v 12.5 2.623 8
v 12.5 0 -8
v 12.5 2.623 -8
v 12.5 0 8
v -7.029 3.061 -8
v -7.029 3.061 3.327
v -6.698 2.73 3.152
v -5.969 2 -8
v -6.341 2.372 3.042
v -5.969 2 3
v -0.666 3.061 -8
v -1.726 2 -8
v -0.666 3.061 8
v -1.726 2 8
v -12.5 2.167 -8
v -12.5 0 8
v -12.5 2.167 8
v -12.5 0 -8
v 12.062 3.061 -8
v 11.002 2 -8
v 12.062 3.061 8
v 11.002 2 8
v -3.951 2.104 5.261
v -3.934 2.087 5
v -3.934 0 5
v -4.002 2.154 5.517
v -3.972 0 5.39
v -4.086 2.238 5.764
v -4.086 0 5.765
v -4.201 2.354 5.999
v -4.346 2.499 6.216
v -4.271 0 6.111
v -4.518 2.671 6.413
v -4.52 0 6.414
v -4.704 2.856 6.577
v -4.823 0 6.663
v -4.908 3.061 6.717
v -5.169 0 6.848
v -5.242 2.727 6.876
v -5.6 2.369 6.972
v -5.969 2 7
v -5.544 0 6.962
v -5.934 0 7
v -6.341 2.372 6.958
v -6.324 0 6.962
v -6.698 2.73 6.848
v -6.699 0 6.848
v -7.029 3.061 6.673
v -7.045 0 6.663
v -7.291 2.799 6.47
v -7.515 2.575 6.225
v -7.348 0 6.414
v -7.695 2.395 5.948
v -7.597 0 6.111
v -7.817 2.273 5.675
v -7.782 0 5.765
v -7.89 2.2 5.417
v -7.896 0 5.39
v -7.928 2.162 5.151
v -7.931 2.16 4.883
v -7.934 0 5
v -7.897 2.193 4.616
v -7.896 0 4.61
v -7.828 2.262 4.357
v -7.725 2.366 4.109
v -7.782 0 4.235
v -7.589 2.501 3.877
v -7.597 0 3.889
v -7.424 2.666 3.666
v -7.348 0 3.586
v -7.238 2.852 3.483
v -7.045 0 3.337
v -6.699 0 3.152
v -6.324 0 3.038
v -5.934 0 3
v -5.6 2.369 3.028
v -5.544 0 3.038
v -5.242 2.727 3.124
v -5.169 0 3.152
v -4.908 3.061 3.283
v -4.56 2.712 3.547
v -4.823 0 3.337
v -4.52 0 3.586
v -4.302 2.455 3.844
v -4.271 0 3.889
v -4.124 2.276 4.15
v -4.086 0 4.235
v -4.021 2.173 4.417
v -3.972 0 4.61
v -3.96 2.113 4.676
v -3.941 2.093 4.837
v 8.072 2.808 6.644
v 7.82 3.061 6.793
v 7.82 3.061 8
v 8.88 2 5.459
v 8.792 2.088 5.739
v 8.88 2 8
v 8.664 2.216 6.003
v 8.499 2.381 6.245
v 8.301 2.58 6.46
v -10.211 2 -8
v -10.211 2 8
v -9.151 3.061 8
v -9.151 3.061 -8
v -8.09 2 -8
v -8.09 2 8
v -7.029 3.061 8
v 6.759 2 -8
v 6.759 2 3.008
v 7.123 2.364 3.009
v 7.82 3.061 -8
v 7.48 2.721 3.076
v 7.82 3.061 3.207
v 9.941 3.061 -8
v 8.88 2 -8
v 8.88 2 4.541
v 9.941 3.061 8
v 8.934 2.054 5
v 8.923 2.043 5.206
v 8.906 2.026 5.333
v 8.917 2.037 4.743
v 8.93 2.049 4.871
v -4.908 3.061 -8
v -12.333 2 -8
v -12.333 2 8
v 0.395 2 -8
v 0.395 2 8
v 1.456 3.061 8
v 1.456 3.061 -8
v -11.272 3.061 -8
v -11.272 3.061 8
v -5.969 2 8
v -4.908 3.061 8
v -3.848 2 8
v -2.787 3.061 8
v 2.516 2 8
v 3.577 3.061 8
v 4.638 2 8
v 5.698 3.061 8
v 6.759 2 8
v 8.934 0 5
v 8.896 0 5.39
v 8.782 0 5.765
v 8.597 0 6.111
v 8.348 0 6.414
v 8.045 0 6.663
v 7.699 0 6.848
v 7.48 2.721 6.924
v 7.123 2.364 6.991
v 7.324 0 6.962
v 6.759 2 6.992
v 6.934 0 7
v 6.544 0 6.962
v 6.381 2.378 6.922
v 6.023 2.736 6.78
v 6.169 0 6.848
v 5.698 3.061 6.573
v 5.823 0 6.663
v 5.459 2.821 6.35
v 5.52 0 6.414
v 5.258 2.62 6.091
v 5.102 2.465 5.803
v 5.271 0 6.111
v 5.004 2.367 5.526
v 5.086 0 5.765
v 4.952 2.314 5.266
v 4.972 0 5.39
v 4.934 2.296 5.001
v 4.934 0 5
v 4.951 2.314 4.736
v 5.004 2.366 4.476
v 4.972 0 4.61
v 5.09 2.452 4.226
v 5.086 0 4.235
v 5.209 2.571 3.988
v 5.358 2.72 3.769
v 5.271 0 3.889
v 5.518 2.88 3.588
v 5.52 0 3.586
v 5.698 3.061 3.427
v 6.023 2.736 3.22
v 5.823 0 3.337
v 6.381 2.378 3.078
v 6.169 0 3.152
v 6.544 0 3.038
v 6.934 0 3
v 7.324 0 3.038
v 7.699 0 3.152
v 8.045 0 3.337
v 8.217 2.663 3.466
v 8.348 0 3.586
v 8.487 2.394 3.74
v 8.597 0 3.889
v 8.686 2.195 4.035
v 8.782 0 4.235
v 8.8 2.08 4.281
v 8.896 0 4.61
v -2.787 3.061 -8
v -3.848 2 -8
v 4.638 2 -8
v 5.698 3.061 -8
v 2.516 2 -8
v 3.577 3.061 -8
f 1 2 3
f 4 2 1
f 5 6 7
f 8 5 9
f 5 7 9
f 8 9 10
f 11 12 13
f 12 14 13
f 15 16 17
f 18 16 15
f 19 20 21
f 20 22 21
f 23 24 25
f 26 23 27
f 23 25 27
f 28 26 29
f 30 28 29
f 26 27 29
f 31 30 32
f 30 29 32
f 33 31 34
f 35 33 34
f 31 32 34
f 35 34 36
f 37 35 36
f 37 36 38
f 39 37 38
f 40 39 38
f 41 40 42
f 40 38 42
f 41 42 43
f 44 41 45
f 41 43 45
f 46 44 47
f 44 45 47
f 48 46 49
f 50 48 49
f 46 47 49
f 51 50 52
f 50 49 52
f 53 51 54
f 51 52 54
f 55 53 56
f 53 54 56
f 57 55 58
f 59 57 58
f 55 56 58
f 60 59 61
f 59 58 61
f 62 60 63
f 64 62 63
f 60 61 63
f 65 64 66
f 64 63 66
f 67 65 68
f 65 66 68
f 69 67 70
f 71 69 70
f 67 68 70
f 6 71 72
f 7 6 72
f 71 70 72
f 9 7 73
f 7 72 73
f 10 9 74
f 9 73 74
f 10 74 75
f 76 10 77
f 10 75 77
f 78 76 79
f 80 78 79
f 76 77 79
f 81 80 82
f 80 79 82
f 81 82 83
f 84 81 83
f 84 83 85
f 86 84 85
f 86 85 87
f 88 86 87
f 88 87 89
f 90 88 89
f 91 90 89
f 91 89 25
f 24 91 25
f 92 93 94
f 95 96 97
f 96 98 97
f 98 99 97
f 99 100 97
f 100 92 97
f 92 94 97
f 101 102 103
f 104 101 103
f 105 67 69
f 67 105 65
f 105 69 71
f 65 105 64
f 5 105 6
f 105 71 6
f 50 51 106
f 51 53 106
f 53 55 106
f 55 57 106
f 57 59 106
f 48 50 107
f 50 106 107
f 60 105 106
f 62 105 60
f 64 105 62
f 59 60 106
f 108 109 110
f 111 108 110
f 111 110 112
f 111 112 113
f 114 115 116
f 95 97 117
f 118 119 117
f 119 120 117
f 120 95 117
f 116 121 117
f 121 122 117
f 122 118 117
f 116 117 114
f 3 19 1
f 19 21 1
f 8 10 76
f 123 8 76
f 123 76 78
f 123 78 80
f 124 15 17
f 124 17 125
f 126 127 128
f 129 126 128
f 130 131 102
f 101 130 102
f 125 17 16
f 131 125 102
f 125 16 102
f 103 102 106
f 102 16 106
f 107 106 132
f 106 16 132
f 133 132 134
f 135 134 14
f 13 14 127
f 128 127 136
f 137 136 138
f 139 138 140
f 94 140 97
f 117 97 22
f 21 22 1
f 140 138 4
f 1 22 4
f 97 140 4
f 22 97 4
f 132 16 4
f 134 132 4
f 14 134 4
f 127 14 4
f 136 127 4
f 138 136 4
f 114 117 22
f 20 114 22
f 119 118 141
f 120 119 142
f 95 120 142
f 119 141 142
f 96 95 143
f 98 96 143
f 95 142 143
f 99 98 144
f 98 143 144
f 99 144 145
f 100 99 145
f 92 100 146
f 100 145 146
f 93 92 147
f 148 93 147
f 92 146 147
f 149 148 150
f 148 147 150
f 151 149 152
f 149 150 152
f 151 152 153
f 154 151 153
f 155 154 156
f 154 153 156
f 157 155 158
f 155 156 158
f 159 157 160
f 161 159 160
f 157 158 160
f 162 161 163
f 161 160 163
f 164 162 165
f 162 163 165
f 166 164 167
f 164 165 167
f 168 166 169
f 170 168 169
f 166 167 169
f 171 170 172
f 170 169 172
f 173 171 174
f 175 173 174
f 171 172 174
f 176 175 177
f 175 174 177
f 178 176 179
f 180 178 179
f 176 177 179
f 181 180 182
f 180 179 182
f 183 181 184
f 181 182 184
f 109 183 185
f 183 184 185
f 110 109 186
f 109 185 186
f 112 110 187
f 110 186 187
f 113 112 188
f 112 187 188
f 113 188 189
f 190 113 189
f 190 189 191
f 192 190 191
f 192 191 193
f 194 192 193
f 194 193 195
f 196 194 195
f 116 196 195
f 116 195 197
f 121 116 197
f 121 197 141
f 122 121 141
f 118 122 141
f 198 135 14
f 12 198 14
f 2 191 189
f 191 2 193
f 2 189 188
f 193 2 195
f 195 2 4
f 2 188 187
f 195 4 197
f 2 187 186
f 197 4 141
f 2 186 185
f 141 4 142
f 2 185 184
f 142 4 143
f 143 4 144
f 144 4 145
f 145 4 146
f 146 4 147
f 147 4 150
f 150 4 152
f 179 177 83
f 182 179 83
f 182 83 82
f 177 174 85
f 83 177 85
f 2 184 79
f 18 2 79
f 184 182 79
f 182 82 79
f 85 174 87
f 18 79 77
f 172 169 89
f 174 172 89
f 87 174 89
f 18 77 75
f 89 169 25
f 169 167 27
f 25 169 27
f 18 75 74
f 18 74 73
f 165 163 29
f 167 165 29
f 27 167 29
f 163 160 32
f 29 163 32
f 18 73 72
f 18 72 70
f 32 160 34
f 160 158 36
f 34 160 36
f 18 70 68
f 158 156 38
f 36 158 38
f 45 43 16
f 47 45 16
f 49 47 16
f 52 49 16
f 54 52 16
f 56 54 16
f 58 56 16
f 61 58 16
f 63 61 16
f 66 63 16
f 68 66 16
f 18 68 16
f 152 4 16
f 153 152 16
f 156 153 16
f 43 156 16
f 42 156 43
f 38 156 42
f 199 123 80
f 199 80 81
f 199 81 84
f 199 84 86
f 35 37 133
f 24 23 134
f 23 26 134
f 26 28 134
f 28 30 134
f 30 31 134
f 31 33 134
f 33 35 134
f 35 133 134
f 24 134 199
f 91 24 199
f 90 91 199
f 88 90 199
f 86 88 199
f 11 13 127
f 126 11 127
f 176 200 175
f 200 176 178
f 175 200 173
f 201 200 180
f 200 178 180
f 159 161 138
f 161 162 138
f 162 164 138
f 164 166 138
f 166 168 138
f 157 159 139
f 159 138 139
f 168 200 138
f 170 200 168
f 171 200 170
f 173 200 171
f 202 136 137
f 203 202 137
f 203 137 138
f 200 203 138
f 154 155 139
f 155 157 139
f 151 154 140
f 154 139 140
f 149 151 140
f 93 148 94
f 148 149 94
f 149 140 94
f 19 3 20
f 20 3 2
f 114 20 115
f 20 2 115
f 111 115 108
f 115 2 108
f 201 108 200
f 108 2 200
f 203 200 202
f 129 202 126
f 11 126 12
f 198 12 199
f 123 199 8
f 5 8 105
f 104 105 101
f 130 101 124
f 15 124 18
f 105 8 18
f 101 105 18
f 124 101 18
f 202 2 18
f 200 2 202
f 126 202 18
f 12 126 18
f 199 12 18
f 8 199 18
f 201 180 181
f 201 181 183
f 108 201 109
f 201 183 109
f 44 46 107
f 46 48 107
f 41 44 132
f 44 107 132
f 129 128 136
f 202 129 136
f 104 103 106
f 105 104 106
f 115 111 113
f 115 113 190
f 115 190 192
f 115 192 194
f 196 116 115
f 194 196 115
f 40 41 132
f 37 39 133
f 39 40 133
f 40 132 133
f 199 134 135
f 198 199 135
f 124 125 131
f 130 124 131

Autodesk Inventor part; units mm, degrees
ref_plane "YZ Plane" through (0, 0, 0) normal (1, 0, 0) x (0, 1, 0)
ref_plane "XZ Plane" through (0, 0, 0) normal (0, 1, 0) x (-1, 0, 0)
ref_plane "XY Plane" through (0, 0, 0) normal (0, 0, 1) x (1, 0, 0)
sketch "Sketch1" plane through (0, 0, 0) normal (0, 1, 0) x (-1, 0, 0)
  line L0 (24, 8) -> (-24, 8)
  line L1 (-24, 8) -> (-24, -8)
  line L2 (-24, -8) -> (24, -8)
  line L3 (24, -8) -> (24, 8)
  point P0 (0, 0)
  dimension "d0" = 48
  dimension "d1" = 16
extrude "Extrusion1" add sketch "Sketch1" along normal blind 2
sketch "Sketch2" plane through (-24, 0, 8) normal (0, 0, 1) x (1, 0, 0)
  line L0 (0, 2) -> (1.5, 2) construction
  line L1 (0, 3.0607) -> (1.0607, 2)
  line L2 (0, 2) -> (48, 2) projected
  line L3 (0, 3.0607) -> (0, 2)
  line L4 (1.0607, 2) -> (2.1213, 3.0607)
  line L5 (1.0607, 2) -> (2.5607, 2) construction
  line L6 (2.1213, 3.0607) -> (3.182, 2)
  line L7 (3.182, 2) -> (4.2426, 3.0607)
  line L8 (4.2426, 3.0607) -> (5.3033, 2)
  line L9 (5.3033, 2) -> (6.364, 3.0607)
  line L10 (6.364, 3.0607) -> (7.4246, 2)
  line L11 (7.4246, 2) -> (8.4853, 3.0607)
  line L12 (7.4246, 2) -> (8.9246, 2) construction
  line L13 (8.4853, 3.0607) -> (9.5459, 2)
  line L14 (9.5459, 2) -> (10.6066, 3.0607)
  line L15 (10.6066, 3.0607) -> (11.6673, 2)
  line L16 (11.6673, 2) -> (12.7279, 3.0607)
  line L17 (12.7279, 3.0607) -> (13.7886, 2)
  line L18 (13.7886, 2) -> (14.8492, 3.0607)
  line L19 (14.8492, 3.0607) -> (15.9099, 2)
  line L20 (15.9099, 2) -> (16.9706, 3.0607)
  line L21 (16.9706, 3.0607) -> (18.0312, 2)
  line L22 (18.0312, 2) -> (19.0919, 3.0607)
  line L23 (19.0919, 3.0607) -> (20.1525, 2)
  line L24 (20.1525, 2) -> (21.2132, 3.0607)
  line L25 (21.2132, 3.0607) -> (22.2739, 2)
  line L26 (22.2739, 2) -> (23.3345, 3.0607)
  line L27 (23.3345, 3.0607) -> (24.3952, 2)
  line L28 (24.3952, 2) -> (25.4558, 3.0607)
  line L29 (25.4558, 3.0607) -> (26.5165, 2)
  line L30 (26.5165, 2) -> (27.5772, 3.0607)
  line L31 (27.5772, 3.0607) -> (28.6378, 2)
  line L32 (27.5772, 3.0607) -> (29.0772, 3.0607) construction
  line L33 (28.6378, 2) -> (29.6985, 3.0607)
  line L34 (29.6985, 3.0607) -> (30.7591, 2)
  line L35 (30.7591, 2) -> (31.8198, 3.0607)
  line L36 (31.8198, 3.0607) -> (32.8805, 2)
  line L37 (32.8805, 2) -> (33.9411, 3.0607)
  line L38 (33.9411, 3.0607) -> (35.0018, 2)
  line L39 (35.0018, 2) -> (36.0624, 3.0607)
  line L40 (36.0624, 3.0607) -> (37.1231, 2)
  line L41 (37.1231, 2) -> (38.1838, 3.0607)
  line L42 (38.1838, 3.0607) -> (39.2444, 2)
  line L43 (39.2444, 2) -> (40.3051, 3.0607)
  line L44 (40.3051, 3.0607) -> (41.3657, 2)
  line L45 (41.3657, 2) -> (42.4264, 3.0607)
  line L46 (42.4264, 3.0607) -> (43.4871, 2)
  line L47 (43.4871, 2) -> (44.5477, 3.0607)
  line L48 (44.5477, 3.0607) -> (45.6084, 2)
  line L49 (45.6084, 2) -> (46.669, 3.0607)
  line L50 (46.669, 3.0607) -> (47.7297, 2)
  line L51 (47.7297, 2) -> (48.7904, 3.0607)
  line L52 (48, 2) -> (48, 2.2703)
  line L53 (48, 0) -> (48, 2) projected
  line L54 (48, 2) -> (0, 2)
  point P0 (24, 0)
  dimension "d6" = 1.5
  dimension "d7" = 1.5
  dimension "d8" = 45
  dimension "d9" = 1.5
  dimension "d10" = 1.5
  dimension "d11" = 90
  dimension "d12" = 1.5
  dimension "d13" = 1.5
  dimension "d14" = 1.5
  dimension "d15" = 1.5
  dimension "d16" = 45
  dimension "d17" = 1.5
  dimension "d18" = 90
  dimension "d19" = 1.5
  dimension "d20" = 1.5
  dimension "d21" = 1.5
  dimension "d22" = 1.5
  dimension "d23" = 1.5
  dimension "d24" = 1.5
  dimension "d25" = 90
  dimension "d26" = 1.5
  dimension "d27" = 90
  dimension "d28" = 1.5
  dimension "d29" = 90
  dimension "d30" = 1.5
  dimension "d31" = 1.5
  dimension "d32" = 1.5
  dimension "d33" = 1.5
  dimension "d34" = 90
  dimension "d35" = 1.5
  dimension "d36" = 90
  dimension "d37" = 1.5
  dimension "d38" = 90
  dimension "d39" = 1.5
  dimension "d40" = 90
  dimension "d41" = 1.5
  dimension "d42" = 90
  dimension "d43" = 1.5
  dimension "d44" = 90
  dimension "d45" = 1.5
  dimension "d46" = 45
  dimension "d47" = 1.5
  dimension "d48" = 90
  dimension "d49" = 1.5
  dimension "d50" = 90
  dimension "d51" = 1.5
  dimension "d52" = 90
  dimension "d53" = 1.5
  dimension "d54" = 90
  dimension "d55" = 1.5
  dimension "d56" = 90
  dimension "d57" = 1.5
  dimension "d58" = 90
  dimension "d59" = 1.5
  dimension "d60" = 90
  dimension "d61" = 1.5
  dimension "d62" = 90
  dimension "d63" = 1.5
  dimension "d64" = 90
  dimension "d65" = 1.5
  dimension "d66" = 90
  dimension "d67" = 1.5
  dimension "d68" = 90
  dimension "d69" = 1.5
extrude "Extrusion2" add sketch "Sketch2" against normal blind 16
sketch "Sketch4" plane through (0, 0, 0) normal (0, -1, 0) x (1, 0, 0)
  line L0 (-24, 8) -> (24, 8) projected
  line L1 (12.5, 8) -> (-12.5, 8)
  line L2 (-12.5, 8) -> (-12.5, -8)
  line L3 (-12.5, -8) -> (12.5, -8)
  line L4 (12.5, -8) -> (12.5, 8)
  line L5 (-12.3327, 8) -> (-12.3327, -8) projected
  line L6 (-12.3327, 8) -> (-24, 8)
  line L7 (-24, 8) -> (-24, -8)
  line L8 (-24, -8) -> (-12.3327, -8)
  line L9 (-12.3327, -8) -> (-12.3327, 8)
  line L10 (24, 8) -> (24, -8) projected
  line L11 (12.5, 8) -> (24, 8)
  line L12 (24, 8) -> (24, -8)
  line L13 (24, -8) -> (12.5, -8)
  line L14 (12.5, -8) -> (12.5, 8)
  point P0 (0, 0)
  dimension "d93" = 25
  dimension "d94" = 16
extrude "Extrusion4" cut sketch "Sketch4" against normal blind 10 contours L0 L2 L8 L7 | L0 L10 L13 L4
sketch "Sketch5" plane through (0, 0, 0) normal (0, -1, 0) x (1, 0, 0)
  circle A0 centre (6.934, 5) radius 2
  circle A1 centre (-5.934, 5) radius 2
  point P0 (0, 0)
  dimension "d97" = 4
  dimension "d98" = 4
extrude "Extrusion5" cut sketch "Sketch5" against normal blind 10
properties part number "gantryTensioner"
